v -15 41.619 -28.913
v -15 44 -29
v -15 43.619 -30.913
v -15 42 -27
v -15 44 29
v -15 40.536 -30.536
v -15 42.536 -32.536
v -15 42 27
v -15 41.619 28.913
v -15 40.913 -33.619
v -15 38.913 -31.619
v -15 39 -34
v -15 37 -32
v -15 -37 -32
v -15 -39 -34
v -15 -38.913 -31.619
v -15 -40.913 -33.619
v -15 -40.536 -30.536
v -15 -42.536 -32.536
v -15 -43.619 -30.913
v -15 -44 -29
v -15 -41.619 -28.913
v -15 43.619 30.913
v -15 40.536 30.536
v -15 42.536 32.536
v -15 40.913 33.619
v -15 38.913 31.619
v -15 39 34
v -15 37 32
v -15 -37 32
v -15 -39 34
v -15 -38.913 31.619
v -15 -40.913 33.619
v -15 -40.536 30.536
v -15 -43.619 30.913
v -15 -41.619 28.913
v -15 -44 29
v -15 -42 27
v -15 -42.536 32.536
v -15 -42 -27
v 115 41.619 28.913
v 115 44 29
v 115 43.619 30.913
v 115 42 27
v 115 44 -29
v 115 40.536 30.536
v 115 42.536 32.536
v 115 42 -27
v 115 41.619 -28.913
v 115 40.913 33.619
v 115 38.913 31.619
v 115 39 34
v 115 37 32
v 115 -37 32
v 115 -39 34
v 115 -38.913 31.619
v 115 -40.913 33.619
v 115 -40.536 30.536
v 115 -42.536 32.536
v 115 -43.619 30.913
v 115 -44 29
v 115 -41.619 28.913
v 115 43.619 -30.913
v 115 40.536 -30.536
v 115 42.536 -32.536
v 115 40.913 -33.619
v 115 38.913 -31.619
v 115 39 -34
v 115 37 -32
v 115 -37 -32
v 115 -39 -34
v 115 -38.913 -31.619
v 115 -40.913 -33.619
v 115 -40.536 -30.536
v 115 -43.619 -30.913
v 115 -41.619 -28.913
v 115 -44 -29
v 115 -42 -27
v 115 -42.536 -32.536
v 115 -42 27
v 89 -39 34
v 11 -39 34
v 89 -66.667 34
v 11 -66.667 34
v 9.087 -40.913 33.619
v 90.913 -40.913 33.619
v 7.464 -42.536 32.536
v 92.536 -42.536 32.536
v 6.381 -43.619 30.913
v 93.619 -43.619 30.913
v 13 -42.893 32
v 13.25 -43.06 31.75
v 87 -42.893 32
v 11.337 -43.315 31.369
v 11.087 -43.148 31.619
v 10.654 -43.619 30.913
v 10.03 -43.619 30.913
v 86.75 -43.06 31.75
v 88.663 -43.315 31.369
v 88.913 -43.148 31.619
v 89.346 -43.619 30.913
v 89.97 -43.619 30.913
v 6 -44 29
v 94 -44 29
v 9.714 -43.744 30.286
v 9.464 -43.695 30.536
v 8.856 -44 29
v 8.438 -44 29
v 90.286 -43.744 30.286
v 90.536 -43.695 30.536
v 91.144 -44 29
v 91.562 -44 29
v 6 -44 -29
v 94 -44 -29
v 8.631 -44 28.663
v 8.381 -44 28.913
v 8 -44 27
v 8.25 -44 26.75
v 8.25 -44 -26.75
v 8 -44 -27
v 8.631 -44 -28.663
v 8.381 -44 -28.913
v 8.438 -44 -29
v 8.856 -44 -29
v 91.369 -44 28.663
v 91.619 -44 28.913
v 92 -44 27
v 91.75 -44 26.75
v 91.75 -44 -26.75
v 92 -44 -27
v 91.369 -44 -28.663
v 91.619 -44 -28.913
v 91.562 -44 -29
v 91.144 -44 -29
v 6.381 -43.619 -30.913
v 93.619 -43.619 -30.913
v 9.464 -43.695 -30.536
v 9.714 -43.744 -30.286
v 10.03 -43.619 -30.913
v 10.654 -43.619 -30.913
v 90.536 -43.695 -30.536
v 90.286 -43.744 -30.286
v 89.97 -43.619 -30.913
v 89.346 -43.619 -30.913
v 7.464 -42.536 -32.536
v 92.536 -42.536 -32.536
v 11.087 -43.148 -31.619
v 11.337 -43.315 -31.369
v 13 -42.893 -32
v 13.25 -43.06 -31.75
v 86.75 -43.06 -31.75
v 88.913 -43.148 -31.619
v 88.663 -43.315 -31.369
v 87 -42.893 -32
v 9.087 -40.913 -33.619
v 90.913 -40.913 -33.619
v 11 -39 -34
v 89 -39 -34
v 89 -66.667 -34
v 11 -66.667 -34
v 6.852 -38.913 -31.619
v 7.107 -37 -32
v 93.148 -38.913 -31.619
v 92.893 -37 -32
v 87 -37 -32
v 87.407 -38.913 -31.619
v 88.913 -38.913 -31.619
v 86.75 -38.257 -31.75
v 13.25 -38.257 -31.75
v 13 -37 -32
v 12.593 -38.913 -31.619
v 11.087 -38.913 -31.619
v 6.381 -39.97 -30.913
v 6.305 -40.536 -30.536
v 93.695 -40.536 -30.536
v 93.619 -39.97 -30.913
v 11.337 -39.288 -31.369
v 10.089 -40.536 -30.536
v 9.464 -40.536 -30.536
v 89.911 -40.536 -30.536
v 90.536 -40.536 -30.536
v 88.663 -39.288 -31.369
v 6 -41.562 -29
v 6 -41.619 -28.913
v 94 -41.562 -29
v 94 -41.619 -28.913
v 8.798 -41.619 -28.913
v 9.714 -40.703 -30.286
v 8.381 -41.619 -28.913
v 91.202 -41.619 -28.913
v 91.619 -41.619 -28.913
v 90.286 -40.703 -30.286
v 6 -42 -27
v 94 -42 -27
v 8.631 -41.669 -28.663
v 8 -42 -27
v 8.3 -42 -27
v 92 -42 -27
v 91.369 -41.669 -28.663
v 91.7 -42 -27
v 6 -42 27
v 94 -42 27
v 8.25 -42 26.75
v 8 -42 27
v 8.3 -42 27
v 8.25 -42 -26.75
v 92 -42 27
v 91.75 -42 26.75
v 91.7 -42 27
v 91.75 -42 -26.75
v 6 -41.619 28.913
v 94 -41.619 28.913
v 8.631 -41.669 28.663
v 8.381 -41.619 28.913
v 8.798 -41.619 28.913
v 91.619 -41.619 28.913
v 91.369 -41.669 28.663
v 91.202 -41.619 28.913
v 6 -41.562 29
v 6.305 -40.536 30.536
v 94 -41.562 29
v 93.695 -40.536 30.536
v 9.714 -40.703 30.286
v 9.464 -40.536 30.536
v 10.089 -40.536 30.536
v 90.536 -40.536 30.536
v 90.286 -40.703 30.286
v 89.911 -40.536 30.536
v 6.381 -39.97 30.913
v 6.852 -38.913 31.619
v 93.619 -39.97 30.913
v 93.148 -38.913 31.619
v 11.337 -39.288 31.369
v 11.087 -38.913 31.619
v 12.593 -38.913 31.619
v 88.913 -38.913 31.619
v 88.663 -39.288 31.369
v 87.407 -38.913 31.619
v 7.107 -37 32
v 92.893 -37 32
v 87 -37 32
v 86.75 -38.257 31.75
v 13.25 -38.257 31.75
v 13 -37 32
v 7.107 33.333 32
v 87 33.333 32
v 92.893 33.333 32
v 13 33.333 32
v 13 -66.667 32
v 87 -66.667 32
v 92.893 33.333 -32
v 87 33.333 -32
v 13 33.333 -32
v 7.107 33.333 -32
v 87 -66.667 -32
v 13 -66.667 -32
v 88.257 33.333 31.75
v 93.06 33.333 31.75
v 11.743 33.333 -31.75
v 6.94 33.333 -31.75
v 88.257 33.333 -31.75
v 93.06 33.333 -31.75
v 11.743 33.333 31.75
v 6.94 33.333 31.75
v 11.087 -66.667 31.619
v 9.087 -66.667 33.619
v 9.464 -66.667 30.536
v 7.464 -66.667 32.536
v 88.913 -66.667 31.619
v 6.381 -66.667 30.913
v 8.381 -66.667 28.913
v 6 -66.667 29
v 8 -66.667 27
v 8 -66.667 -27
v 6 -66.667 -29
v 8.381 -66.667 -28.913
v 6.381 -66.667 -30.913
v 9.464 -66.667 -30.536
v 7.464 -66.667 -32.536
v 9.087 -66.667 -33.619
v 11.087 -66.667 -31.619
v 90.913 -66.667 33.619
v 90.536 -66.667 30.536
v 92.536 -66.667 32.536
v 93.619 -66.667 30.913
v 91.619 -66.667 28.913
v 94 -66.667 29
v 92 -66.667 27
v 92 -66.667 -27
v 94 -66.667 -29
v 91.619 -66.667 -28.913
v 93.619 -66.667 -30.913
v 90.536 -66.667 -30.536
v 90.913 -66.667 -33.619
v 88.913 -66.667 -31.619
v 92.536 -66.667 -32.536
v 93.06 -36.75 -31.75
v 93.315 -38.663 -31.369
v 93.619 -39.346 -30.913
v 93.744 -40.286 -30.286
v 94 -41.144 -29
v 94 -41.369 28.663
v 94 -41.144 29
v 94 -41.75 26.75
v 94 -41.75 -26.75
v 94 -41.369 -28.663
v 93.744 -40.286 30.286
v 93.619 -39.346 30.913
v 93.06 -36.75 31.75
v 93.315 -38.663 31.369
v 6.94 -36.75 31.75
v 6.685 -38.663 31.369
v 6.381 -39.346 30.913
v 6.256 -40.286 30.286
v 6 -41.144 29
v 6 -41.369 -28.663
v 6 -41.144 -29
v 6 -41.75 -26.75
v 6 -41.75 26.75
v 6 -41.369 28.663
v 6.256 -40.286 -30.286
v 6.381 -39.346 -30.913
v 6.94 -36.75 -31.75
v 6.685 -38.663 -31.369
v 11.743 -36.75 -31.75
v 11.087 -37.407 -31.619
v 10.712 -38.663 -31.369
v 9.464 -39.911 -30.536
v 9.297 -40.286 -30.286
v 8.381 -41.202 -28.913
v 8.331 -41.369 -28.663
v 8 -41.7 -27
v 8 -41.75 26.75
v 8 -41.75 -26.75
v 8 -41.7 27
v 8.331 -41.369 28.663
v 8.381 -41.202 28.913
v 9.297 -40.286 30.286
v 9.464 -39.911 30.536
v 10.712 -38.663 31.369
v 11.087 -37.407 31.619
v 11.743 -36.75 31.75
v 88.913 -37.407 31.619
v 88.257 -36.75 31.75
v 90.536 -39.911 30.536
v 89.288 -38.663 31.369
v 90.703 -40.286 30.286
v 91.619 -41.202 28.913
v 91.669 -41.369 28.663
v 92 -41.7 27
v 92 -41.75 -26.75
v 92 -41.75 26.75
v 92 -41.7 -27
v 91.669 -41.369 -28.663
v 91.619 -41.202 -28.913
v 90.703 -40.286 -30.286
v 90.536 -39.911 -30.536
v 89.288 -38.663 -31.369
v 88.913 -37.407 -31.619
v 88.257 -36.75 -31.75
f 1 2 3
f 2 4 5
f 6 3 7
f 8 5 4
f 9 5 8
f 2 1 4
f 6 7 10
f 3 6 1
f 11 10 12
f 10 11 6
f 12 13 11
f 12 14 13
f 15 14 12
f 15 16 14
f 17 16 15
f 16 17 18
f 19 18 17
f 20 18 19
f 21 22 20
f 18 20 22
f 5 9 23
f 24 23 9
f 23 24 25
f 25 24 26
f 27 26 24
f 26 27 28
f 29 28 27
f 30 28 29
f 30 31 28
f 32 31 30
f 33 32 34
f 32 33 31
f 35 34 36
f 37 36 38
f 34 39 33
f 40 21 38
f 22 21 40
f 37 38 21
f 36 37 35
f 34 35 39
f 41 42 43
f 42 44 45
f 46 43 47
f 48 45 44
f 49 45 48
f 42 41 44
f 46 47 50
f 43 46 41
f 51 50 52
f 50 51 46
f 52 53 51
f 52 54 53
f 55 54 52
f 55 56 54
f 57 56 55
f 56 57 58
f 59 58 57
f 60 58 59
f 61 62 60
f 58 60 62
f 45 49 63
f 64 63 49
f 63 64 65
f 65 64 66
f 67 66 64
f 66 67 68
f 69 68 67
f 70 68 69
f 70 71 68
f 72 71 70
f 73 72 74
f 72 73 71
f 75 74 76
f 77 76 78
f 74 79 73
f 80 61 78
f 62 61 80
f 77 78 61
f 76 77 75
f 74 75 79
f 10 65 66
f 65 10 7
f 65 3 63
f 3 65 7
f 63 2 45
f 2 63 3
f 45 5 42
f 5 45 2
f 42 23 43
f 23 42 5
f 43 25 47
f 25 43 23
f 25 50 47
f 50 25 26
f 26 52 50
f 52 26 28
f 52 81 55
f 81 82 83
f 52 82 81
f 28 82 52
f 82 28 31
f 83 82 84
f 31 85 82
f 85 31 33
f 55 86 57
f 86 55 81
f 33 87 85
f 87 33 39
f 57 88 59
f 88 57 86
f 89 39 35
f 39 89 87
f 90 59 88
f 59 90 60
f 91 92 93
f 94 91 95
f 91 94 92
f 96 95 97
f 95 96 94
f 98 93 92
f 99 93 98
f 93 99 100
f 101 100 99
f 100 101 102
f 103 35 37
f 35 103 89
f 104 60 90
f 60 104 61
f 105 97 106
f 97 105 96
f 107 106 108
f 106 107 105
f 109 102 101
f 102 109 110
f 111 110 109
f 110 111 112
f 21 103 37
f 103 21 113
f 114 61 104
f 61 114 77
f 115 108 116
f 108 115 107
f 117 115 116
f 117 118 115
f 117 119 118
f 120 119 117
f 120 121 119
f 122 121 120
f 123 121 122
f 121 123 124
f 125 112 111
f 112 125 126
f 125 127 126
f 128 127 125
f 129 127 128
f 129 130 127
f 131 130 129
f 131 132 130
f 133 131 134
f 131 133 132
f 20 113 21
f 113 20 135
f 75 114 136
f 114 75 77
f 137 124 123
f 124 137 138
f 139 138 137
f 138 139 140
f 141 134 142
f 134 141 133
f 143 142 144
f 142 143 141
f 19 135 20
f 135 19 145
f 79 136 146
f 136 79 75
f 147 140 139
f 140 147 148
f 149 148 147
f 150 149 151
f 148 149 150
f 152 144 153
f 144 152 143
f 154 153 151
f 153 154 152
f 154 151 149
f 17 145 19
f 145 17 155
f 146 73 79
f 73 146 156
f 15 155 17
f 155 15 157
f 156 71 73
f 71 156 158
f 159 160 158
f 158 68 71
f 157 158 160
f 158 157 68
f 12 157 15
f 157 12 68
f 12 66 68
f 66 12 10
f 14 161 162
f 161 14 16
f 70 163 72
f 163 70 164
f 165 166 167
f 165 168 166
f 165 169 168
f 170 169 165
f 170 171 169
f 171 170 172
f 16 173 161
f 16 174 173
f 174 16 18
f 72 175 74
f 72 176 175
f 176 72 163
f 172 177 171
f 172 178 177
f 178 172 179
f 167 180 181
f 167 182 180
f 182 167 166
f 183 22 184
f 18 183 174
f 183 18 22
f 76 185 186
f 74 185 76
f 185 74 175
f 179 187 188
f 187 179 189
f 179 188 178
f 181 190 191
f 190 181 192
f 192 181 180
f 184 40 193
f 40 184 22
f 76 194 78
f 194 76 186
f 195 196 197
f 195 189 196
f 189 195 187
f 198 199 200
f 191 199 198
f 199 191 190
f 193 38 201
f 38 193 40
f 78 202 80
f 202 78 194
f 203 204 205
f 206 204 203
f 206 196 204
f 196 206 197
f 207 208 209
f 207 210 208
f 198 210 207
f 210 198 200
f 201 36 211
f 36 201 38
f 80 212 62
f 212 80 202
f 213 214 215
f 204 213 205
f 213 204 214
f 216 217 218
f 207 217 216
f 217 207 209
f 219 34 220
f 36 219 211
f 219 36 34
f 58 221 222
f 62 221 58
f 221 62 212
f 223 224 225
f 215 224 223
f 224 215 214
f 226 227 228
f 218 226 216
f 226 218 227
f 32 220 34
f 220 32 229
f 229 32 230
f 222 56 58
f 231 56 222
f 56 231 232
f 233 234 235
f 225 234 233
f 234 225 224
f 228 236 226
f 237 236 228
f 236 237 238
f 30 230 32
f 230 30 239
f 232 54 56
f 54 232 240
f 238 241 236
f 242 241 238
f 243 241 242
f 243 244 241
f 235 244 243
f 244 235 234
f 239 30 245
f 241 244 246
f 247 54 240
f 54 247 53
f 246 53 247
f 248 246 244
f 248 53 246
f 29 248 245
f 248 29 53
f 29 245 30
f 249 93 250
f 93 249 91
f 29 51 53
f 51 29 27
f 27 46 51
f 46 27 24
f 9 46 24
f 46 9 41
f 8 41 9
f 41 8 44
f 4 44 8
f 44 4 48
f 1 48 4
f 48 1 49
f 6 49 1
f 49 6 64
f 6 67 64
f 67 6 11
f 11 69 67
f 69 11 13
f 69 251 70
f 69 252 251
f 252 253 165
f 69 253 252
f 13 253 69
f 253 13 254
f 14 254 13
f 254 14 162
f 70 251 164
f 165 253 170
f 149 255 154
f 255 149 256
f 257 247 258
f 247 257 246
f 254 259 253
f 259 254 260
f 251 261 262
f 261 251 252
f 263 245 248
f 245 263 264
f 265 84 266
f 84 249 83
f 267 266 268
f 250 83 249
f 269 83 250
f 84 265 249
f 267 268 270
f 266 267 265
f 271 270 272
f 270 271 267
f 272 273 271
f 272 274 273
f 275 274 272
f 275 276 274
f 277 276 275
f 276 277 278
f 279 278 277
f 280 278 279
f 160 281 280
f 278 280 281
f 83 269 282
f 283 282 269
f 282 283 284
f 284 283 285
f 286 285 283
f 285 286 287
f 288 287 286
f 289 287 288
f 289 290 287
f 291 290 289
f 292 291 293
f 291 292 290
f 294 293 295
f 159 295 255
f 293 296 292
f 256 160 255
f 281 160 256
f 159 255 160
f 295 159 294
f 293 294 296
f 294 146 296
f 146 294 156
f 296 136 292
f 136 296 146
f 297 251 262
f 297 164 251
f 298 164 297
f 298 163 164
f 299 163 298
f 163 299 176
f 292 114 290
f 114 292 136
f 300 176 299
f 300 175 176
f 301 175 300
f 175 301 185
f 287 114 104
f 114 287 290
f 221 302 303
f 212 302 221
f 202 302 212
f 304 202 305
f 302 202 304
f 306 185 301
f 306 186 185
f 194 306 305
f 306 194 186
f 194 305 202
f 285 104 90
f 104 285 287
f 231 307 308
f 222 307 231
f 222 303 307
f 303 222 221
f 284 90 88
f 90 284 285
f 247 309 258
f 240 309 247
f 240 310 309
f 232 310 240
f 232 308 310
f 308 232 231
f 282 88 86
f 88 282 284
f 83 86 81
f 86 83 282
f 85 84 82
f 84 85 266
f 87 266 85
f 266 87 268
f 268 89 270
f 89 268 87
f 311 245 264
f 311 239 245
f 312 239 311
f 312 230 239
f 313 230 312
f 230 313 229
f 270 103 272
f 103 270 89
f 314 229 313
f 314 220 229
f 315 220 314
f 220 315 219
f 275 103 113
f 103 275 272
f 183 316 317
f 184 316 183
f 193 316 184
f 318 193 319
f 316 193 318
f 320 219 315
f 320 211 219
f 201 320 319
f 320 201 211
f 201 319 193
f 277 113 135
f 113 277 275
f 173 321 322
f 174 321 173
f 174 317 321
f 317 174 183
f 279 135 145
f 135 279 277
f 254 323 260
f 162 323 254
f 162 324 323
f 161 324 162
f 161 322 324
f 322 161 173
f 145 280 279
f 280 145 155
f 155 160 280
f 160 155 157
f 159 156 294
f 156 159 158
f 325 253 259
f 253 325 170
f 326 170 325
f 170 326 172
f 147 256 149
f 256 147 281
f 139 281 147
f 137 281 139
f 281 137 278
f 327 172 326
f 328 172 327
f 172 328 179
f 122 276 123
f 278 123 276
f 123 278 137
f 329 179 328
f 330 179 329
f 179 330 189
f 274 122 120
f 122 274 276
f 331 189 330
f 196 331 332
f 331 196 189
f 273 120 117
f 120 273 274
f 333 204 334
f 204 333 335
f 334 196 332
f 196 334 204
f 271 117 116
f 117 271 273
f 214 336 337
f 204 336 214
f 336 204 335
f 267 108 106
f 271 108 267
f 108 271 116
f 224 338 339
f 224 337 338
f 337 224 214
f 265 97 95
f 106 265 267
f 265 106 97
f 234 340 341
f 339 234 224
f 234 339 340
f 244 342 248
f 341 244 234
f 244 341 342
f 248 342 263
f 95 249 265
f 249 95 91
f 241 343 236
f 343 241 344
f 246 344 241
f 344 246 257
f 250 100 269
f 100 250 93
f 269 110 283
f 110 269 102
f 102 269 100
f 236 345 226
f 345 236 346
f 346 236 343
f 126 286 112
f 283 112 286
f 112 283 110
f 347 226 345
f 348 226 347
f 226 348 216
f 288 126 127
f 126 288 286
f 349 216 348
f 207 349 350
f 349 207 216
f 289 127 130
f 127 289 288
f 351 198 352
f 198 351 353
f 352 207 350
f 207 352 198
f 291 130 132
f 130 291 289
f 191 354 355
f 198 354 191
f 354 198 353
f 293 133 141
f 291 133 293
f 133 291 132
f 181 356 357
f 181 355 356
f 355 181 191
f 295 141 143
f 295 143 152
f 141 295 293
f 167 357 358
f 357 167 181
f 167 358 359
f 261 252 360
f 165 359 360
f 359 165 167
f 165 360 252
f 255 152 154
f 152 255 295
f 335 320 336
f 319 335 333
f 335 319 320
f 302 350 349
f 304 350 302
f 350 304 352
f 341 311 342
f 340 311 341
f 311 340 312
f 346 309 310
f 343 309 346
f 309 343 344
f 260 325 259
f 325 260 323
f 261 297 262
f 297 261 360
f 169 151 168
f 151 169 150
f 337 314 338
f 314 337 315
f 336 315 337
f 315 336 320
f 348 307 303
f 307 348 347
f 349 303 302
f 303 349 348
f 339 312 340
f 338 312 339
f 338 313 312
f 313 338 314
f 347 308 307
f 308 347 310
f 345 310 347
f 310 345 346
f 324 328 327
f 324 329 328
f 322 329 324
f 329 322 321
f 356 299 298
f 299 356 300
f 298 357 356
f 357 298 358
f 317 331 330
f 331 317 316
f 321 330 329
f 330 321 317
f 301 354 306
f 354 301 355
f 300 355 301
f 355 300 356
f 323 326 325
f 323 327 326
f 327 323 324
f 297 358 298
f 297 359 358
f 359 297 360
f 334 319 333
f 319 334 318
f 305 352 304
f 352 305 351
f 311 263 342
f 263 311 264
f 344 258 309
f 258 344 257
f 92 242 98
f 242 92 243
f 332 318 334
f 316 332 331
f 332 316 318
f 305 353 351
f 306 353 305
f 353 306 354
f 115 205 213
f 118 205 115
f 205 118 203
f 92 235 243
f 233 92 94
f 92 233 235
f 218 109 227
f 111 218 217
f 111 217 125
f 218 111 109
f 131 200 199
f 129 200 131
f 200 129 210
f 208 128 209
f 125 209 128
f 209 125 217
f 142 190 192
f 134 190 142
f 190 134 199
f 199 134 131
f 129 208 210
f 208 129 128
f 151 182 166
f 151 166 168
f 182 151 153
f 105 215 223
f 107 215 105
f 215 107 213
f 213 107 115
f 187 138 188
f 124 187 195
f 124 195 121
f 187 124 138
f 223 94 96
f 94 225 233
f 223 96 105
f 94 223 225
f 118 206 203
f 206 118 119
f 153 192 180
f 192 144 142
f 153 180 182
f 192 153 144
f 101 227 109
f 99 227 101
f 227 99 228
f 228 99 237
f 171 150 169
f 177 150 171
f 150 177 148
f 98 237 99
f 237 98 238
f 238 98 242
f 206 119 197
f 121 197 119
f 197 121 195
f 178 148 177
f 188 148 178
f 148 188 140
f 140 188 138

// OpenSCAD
outerwidth1 = 78;
outerheight1 = 58;
height1 = 100;
wallThickness1 = 4;

outerwidth2 = 73.5;
outerheight2 = 53.5;
height2 = 100;
wallThickness2 = 4;


difference()
{
    crossTube(outerwidth1, outerheight1, wallThickness1, height1,
        outerwidth1, outerheight1, wallThickness1, height1);
    
    solidCrossTube(outerwidth2, outerheight2, wallThickness2, height1,
    outerwidth2, outerheight2, wallThickness2, height1);
    
}


module squareTube(outerwidth, outerheight, wallThickness, height)
{
        linear_extrude(height,true)
    difference()
    {
        minkowski()
        {
        square([outerwidth, outerheight],true);
            circle(5);
        }
        minkowski()
        {
        square([outerwidth-wallThickness,outerheight-wallThickness],true);
                        circle(5);
        }
    }
}

module crossTube(outerwidth1, outerheight1, wallThickness1, height1,
                outerwidth2, outerheight2, wallThickness2, height2)
{
    union()
    {
        translate([-15,0,0])
        rotate([90,0,90]) 
        squareTube(outerwidth1,outerheight1,wallThickness1,height1+30);


        translate([height1/2,height1/3,0])
        rotate([90,0,0]) 
        squareTube(outerwidth1,outerheight1,wallThickness2,height1);
    }
}

module solidTube(outerwidth, outerheight, wallThickness, height)
{
    linear_extrude(height,true)
    minkowski()
    {
        square([outerwidth, outerheight],true);
        circle(5);
    }
}

module solidCrossTube(outerwidth1, outerheight1, wallThickness1, height1,
                outerwidth2, outerheight2, wallThickness2, height2)
{
    union()
    {
    rotate([90,0,90]) 
    solidTube(outerwidth1,outerheight1,wallThickness1,height1);


    translate([height1/2,height1/3,0])
    rotate([90,0,0]) 
    solidTube(outerwidth1,outerheight1,wallThickness2,height1);
    }
}
